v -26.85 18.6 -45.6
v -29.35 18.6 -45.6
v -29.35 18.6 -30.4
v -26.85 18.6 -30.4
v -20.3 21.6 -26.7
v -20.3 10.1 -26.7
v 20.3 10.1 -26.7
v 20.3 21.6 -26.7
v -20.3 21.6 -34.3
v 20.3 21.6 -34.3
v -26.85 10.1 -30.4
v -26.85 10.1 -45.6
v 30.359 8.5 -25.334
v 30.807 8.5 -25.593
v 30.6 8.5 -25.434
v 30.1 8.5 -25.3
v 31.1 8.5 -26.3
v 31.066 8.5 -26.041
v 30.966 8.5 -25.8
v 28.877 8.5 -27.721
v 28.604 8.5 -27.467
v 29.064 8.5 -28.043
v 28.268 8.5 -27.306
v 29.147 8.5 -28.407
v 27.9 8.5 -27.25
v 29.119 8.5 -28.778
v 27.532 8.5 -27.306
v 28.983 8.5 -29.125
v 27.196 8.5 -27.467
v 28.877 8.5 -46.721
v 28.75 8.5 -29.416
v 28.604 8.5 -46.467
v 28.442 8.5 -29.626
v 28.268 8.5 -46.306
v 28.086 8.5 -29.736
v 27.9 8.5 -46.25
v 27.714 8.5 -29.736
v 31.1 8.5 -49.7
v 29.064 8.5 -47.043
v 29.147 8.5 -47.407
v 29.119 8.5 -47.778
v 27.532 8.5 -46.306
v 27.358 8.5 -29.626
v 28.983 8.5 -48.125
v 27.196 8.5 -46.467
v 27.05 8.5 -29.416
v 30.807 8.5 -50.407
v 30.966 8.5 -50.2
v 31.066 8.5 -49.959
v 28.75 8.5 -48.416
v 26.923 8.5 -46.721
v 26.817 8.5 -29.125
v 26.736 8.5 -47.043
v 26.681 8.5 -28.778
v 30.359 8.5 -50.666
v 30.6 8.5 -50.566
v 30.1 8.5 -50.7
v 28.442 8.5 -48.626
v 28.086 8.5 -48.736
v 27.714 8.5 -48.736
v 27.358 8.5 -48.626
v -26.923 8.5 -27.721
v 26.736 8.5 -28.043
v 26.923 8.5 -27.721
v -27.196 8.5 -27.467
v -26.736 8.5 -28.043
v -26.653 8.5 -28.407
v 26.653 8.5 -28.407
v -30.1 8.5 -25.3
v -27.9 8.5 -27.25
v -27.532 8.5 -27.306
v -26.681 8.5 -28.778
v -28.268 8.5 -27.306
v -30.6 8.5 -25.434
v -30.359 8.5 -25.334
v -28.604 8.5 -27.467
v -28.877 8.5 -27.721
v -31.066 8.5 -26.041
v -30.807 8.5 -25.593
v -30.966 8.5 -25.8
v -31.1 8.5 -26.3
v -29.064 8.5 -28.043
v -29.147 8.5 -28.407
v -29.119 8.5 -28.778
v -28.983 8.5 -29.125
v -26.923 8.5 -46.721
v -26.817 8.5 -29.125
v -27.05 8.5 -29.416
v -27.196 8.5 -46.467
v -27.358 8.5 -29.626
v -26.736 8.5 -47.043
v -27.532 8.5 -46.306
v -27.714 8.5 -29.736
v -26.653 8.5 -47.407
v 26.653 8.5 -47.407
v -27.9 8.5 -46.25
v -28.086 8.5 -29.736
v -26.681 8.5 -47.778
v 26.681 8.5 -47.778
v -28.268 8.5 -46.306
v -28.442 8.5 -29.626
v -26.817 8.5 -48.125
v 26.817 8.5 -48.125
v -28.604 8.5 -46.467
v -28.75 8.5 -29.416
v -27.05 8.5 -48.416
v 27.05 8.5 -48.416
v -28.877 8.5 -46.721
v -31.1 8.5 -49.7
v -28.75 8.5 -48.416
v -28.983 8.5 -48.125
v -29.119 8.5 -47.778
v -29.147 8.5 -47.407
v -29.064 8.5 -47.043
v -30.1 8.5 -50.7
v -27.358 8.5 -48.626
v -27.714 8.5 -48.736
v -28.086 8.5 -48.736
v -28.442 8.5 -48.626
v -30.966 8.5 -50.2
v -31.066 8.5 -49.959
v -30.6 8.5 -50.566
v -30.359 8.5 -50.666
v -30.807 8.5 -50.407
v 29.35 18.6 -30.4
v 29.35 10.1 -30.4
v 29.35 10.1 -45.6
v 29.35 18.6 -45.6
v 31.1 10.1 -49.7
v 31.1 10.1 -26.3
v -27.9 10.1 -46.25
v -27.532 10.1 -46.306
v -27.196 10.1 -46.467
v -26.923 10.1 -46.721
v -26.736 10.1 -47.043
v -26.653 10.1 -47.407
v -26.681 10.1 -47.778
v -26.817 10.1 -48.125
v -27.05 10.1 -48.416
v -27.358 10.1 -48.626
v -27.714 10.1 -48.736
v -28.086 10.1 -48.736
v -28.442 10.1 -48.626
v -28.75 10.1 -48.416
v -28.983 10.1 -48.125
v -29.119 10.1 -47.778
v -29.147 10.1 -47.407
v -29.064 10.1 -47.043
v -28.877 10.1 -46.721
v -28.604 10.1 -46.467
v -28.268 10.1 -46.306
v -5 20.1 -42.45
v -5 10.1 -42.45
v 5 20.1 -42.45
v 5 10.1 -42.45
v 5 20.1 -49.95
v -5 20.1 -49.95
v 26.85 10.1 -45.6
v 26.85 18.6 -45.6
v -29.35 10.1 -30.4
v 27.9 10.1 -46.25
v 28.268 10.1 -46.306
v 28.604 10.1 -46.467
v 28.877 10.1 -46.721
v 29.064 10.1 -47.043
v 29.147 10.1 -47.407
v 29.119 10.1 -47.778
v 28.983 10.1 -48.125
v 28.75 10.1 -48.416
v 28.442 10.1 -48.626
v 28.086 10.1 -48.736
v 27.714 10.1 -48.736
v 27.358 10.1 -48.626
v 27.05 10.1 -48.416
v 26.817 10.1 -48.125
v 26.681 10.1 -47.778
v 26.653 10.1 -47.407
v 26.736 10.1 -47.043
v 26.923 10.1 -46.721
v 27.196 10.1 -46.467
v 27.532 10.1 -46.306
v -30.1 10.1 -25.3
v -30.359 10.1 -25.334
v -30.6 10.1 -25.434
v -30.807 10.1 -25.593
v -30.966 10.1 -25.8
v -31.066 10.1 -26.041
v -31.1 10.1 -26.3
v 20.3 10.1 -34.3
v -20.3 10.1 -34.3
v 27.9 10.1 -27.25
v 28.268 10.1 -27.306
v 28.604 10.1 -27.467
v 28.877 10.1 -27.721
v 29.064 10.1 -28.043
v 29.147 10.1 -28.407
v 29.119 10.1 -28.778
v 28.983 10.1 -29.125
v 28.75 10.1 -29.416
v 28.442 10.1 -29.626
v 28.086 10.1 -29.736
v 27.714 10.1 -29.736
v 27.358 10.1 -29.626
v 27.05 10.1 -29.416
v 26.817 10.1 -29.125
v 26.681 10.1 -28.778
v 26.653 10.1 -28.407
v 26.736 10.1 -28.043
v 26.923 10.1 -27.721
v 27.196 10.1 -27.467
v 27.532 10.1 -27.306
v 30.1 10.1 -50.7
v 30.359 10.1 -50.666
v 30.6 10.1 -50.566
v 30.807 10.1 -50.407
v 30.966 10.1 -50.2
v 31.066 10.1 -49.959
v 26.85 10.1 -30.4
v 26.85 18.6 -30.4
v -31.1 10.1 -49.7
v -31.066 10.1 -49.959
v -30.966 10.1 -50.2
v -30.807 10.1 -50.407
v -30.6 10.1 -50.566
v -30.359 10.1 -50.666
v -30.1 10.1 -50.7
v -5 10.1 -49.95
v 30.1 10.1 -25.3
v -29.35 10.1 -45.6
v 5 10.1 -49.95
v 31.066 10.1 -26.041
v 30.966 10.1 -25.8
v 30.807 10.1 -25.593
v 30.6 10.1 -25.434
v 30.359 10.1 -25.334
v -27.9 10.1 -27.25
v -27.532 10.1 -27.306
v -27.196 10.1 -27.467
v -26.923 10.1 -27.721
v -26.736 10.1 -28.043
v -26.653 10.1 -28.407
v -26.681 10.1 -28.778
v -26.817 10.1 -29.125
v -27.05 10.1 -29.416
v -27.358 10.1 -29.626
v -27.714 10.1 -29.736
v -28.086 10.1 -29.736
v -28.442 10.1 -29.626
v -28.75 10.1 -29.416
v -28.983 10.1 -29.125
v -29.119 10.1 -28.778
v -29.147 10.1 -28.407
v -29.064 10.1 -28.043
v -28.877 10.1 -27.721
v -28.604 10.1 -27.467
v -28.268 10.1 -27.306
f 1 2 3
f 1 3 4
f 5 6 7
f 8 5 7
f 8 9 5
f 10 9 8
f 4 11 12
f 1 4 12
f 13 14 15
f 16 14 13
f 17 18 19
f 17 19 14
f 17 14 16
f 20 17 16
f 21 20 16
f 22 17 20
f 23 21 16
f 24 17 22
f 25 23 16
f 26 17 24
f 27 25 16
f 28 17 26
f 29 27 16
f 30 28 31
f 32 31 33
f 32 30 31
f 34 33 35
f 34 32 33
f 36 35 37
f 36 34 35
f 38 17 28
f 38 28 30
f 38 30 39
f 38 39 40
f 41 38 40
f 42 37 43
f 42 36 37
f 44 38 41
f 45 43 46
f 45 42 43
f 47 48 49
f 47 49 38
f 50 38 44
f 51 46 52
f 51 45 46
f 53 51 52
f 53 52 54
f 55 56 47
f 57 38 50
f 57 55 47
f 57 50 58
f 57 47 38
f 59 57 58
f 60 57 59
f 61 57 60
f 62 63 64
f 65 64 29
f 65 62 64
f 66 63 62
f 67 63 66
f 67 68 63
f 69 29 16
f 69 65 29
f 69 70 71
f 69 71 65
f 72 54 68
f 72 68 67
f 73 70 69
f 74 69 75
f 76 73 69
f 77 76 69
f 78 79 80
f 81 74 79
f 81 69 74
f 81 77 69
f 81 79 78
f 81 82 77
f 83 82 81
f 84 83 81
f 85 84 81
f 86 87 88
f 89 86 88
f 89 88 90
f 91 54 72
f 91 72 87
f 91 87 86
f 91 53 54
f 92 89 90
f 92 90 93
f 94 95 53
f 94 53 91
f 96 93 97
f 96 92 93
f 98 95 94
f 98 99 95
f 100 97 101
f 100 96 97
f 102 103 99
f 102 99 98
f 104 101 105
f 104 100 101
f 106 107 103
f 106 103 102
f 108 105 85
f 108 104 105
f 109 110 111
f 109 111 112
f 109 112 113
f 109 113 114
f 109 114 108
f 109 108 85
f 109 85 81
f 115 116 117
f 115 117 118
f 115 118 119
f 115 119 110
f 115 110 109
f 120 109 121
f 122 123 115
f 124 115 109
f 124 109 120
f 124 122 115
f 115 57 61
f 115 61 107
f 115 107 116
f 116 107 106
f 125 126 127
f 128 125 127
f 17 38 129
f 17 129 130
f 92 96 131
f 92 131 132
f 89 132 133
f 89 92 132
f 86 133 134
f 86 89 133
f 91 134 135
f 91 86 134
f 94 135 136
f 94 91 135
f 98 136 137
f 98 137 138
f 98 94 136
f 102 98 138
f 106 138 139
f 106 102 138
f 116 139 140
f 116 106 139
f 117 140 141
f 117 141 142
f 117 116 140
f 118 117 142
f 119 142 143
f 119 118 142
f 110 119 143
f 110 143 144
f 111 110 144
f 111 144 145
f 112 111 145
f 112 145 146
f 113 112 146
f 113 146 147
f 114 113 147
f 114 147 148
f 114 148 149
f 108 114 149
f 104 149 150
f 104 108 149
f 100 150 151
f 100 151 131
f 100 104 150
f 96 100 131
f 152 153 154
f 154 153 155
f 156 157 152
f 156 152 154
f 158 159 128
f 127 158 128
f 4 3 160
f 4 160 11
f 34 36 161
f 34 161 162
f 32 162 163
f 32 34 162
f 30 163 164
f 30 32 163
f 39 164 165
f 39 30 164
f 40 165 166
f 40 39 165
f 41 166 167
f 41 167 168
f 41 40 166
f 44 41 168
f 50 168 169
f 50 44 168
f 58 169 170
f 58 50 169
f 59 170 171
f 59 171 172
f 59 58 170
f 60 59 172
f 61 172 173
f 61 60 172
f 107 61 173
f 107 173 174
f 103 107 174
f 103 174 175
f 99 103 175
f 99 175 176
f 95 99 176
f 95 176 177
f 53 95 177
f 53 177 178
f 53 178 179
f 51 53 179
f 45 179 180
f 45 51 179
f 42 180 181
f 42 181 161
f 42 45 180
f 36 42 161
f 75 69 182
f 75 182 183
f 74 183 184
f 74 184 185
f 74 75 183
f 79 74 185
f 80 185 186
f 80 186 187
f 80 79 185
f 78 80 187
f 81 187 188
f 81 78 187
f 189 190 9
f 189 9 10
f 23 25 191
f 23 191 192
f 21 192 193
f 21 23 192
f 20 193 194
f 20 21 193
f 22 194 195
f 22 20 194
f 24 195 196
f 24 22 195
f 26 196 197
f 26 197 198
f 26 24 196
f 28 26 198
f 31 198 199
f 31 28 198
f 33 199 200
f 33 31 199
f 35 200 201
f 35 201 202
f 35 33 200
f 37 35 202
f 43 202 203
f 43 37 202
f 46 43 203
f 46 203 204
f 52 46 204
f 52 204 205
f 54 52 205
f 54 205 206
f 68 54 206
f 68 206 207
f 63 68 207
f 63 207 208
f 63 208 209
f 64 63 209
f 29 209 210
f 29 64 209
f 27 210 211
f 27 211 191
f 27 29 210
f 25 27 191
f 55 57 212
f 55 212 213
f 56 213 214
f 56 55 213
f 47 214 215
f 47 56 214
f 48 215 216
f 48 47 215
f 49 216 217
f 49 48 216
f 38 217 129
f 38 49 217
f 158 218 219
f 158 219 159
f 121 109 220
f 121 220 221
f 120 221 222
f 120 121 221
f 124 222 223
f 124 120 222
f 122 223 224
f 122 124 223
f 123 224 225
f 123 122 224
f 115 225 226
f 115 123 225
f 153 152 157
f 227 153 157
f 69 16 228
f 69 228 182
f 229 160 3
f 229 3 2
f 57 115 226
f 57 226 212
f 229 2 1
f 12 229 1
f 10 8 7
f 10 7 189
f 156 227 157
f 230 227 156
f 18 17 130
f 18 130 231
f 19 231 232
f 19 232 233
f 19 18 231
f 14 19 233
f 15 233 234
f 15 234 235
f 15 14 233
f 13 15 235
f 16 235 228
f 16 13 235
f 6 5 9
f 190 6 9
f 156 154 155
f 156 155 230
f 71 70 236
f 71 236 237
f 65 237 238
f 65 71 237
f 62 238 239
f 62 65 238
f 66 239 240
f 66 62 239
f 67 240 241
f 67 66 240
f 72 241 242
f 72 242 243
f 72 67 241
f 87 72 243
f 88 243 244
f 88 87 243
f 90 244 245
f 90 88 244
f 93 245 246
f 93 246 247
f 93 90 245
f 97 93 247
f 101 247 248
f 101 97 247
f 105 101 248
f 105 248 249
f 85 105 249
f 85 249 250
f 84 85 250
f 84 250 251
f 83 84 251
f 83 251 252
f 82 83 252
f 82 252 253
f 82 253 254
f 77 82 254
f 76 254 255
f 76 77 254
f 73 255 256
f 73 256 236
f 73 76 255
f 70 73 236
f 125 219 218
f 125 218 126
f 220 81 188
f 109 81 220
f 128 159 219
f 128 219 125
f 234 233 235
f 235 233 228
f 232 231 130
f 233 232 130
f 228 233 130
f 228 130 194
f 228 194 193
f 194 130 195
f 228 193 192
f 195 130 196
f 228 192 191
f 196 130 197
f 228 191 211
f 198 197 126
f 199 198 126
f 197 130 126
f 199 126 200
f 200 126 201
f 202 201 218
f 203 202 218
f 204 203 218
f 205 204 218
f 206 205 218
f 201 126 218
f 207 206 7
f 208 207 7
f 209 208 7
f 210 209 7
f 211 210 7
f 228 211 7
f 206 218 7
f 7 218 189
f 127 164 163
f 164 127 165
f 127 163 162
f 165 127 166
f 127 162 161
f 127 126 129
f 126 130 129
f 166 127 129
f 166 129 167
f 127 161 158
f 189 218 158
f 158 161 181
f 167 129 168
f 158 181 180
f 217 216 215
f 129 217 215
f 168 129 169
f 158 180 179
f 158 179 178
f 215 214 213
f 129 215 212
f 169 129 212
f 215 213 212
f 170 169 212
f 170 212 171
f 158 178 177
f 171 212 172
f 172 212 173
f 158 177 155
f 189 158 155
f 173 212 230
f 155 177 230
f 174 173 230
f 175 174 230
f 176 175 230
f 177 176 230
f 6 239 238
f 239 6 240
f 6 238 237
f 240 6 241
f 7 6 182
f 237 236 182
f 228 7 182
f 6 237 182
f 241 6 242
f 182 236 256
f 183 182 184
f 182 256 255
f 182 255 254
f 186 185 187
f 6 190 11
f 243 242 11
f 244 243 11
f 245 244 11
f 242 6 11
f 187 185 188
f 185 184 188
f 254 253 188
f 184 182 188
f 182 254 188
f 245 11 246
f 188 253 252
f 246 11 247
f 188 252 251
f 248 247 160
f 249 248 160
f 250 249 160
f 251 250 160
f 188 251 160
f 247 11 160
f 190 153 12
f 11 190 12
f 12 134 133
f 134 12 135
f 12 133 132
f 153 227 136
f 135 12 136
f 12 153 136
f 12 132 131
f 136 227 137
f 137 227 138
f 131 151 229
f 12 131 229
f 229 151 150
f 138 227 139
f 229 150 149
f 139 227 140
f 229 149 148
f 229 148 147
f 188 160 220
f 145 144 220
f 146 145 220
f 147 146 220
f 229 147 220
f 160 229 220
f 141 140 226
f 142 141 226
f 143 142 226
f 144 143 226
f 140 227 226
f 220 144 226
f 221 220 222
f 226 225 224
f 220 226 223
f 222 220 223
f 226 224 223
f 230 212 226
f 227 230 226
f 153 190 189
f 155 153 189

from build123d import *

# Parameters (mm, degrees)
BOARD_START         = 8.5
SKETCH1_R           = 1.25
BOARD_DEPTH         = 1.6
SERVO_START         = 10.1
SKETCH2_W           = 40.6
SKETCH2_H           = 7.6
SERVO_HEADERS_DEPTH = 11.5
V_START             = 10.1
SKETCH3_W           = 10
SKETCH3_H           = 7.5
V_TERMINAL_DEPTH    = 10
I2C_START           = 10.1
SKETCH4_W           = 2.5
SKETCH4_H           = 15.2
I2C_HEADERS_DEPTH   = 8.5


with BuildPart() as part:
    # Sketch1 → Board (new body)
    with BuildSketch(Plane(origin=(0, 0, 0), x_dir=(1, 0, 0), z_dir=(0, 1, 0)).offset(BOARD_START)):
        with BuildLine():
            Line((-30.1, 50.7), (30.1, 50.7))
            ThreePointArc((30.1, 50.7), (30.807106781, 50.407106781), (31.1, 49.7))
            Line((31.1, 49.7), (31.1, 26.3))
            ThreePointArc((31.1, 26.3), (30.807106781, 25.592893219), (30.1, 25.3))
            Line((30.1, 25.3), (-30.1, 25.3))
            ThreePointArc((-30.1, 25.3), (-30.807106781, 25.592893219), (-31.1, 26.3))
            Line((-31.1, 26.3), (-31.1, 49.7))
            ThreePointArc((-31.1, 49.7), (-30.807106781, 50.407106781), (-30.1, 50.7))
        make_face()
        with Locations(Location((-27.9, 47.5, 0), (0, 0, 270))):
            Circle(SKETCH1_R, mode=Mode.SUBTRACT)
        with Locations(Location((-27.9, 28.5, 0), (0, 0, 270))):
            Circle(SKETCH1_R, mode=Mode.SUBTRACT)
        with Locations(Location((27.9, 47.5, 0), (0, 0, 270))):
            Circle(SKETCH1_R, mode=Mode.SUBTRACT)
        with Locations(Location((27.9, 28.5, 0), (0, 0, 270))):
            Circle(SKETCH1_R, mode=Mode.SUBTRACT)
    extrude(amount=BOARD_DEPTH)

    # Sketch2 → Servo headers (add)
    with BuildSketch(Plane(origin=(0, 0, 0), x_dir=(1, 0, 0), z_dir=(0, 1, 0)).offset(SERVO_START)):
        with Locations((0, 30.5)):
            Rectangle(SKETCH2_W, SKETCH2_H)
    extrude(amount=SERVO_HEADERS_DEPTH)

    # Sketch3 → V+ terminal (add)
    with BuildSketch(Plane(origin=(0, 0, 0), x_dir=(1, 0, 0), z_dir=(0, 1, 0)).offset(V_START)):
        with Locations((0, 46.2)):
            Rectangle(SKETCH3_W, SKETCH3_H)
    extrude(amount=V_TERMINAL_DEPTH)

    # Sketch4 → I2C headers (add)
    with BuildSketch(Plane(origin=(0, 0, 0), x_dir=(1, 0, 0), z_dir=(0, 1, 0)).offset(I2C_START)):
        with Locations((-28.1, 38)):
            Rectangle(SKETCH4_W, SKETCH4_H)
        with Locations((28.1, 38)):
            Rectangle(SKETCH4_W, SKETCH4_H)
    extrude(amount=I2C_HEADERS_DEPTH)


solid = part.part
